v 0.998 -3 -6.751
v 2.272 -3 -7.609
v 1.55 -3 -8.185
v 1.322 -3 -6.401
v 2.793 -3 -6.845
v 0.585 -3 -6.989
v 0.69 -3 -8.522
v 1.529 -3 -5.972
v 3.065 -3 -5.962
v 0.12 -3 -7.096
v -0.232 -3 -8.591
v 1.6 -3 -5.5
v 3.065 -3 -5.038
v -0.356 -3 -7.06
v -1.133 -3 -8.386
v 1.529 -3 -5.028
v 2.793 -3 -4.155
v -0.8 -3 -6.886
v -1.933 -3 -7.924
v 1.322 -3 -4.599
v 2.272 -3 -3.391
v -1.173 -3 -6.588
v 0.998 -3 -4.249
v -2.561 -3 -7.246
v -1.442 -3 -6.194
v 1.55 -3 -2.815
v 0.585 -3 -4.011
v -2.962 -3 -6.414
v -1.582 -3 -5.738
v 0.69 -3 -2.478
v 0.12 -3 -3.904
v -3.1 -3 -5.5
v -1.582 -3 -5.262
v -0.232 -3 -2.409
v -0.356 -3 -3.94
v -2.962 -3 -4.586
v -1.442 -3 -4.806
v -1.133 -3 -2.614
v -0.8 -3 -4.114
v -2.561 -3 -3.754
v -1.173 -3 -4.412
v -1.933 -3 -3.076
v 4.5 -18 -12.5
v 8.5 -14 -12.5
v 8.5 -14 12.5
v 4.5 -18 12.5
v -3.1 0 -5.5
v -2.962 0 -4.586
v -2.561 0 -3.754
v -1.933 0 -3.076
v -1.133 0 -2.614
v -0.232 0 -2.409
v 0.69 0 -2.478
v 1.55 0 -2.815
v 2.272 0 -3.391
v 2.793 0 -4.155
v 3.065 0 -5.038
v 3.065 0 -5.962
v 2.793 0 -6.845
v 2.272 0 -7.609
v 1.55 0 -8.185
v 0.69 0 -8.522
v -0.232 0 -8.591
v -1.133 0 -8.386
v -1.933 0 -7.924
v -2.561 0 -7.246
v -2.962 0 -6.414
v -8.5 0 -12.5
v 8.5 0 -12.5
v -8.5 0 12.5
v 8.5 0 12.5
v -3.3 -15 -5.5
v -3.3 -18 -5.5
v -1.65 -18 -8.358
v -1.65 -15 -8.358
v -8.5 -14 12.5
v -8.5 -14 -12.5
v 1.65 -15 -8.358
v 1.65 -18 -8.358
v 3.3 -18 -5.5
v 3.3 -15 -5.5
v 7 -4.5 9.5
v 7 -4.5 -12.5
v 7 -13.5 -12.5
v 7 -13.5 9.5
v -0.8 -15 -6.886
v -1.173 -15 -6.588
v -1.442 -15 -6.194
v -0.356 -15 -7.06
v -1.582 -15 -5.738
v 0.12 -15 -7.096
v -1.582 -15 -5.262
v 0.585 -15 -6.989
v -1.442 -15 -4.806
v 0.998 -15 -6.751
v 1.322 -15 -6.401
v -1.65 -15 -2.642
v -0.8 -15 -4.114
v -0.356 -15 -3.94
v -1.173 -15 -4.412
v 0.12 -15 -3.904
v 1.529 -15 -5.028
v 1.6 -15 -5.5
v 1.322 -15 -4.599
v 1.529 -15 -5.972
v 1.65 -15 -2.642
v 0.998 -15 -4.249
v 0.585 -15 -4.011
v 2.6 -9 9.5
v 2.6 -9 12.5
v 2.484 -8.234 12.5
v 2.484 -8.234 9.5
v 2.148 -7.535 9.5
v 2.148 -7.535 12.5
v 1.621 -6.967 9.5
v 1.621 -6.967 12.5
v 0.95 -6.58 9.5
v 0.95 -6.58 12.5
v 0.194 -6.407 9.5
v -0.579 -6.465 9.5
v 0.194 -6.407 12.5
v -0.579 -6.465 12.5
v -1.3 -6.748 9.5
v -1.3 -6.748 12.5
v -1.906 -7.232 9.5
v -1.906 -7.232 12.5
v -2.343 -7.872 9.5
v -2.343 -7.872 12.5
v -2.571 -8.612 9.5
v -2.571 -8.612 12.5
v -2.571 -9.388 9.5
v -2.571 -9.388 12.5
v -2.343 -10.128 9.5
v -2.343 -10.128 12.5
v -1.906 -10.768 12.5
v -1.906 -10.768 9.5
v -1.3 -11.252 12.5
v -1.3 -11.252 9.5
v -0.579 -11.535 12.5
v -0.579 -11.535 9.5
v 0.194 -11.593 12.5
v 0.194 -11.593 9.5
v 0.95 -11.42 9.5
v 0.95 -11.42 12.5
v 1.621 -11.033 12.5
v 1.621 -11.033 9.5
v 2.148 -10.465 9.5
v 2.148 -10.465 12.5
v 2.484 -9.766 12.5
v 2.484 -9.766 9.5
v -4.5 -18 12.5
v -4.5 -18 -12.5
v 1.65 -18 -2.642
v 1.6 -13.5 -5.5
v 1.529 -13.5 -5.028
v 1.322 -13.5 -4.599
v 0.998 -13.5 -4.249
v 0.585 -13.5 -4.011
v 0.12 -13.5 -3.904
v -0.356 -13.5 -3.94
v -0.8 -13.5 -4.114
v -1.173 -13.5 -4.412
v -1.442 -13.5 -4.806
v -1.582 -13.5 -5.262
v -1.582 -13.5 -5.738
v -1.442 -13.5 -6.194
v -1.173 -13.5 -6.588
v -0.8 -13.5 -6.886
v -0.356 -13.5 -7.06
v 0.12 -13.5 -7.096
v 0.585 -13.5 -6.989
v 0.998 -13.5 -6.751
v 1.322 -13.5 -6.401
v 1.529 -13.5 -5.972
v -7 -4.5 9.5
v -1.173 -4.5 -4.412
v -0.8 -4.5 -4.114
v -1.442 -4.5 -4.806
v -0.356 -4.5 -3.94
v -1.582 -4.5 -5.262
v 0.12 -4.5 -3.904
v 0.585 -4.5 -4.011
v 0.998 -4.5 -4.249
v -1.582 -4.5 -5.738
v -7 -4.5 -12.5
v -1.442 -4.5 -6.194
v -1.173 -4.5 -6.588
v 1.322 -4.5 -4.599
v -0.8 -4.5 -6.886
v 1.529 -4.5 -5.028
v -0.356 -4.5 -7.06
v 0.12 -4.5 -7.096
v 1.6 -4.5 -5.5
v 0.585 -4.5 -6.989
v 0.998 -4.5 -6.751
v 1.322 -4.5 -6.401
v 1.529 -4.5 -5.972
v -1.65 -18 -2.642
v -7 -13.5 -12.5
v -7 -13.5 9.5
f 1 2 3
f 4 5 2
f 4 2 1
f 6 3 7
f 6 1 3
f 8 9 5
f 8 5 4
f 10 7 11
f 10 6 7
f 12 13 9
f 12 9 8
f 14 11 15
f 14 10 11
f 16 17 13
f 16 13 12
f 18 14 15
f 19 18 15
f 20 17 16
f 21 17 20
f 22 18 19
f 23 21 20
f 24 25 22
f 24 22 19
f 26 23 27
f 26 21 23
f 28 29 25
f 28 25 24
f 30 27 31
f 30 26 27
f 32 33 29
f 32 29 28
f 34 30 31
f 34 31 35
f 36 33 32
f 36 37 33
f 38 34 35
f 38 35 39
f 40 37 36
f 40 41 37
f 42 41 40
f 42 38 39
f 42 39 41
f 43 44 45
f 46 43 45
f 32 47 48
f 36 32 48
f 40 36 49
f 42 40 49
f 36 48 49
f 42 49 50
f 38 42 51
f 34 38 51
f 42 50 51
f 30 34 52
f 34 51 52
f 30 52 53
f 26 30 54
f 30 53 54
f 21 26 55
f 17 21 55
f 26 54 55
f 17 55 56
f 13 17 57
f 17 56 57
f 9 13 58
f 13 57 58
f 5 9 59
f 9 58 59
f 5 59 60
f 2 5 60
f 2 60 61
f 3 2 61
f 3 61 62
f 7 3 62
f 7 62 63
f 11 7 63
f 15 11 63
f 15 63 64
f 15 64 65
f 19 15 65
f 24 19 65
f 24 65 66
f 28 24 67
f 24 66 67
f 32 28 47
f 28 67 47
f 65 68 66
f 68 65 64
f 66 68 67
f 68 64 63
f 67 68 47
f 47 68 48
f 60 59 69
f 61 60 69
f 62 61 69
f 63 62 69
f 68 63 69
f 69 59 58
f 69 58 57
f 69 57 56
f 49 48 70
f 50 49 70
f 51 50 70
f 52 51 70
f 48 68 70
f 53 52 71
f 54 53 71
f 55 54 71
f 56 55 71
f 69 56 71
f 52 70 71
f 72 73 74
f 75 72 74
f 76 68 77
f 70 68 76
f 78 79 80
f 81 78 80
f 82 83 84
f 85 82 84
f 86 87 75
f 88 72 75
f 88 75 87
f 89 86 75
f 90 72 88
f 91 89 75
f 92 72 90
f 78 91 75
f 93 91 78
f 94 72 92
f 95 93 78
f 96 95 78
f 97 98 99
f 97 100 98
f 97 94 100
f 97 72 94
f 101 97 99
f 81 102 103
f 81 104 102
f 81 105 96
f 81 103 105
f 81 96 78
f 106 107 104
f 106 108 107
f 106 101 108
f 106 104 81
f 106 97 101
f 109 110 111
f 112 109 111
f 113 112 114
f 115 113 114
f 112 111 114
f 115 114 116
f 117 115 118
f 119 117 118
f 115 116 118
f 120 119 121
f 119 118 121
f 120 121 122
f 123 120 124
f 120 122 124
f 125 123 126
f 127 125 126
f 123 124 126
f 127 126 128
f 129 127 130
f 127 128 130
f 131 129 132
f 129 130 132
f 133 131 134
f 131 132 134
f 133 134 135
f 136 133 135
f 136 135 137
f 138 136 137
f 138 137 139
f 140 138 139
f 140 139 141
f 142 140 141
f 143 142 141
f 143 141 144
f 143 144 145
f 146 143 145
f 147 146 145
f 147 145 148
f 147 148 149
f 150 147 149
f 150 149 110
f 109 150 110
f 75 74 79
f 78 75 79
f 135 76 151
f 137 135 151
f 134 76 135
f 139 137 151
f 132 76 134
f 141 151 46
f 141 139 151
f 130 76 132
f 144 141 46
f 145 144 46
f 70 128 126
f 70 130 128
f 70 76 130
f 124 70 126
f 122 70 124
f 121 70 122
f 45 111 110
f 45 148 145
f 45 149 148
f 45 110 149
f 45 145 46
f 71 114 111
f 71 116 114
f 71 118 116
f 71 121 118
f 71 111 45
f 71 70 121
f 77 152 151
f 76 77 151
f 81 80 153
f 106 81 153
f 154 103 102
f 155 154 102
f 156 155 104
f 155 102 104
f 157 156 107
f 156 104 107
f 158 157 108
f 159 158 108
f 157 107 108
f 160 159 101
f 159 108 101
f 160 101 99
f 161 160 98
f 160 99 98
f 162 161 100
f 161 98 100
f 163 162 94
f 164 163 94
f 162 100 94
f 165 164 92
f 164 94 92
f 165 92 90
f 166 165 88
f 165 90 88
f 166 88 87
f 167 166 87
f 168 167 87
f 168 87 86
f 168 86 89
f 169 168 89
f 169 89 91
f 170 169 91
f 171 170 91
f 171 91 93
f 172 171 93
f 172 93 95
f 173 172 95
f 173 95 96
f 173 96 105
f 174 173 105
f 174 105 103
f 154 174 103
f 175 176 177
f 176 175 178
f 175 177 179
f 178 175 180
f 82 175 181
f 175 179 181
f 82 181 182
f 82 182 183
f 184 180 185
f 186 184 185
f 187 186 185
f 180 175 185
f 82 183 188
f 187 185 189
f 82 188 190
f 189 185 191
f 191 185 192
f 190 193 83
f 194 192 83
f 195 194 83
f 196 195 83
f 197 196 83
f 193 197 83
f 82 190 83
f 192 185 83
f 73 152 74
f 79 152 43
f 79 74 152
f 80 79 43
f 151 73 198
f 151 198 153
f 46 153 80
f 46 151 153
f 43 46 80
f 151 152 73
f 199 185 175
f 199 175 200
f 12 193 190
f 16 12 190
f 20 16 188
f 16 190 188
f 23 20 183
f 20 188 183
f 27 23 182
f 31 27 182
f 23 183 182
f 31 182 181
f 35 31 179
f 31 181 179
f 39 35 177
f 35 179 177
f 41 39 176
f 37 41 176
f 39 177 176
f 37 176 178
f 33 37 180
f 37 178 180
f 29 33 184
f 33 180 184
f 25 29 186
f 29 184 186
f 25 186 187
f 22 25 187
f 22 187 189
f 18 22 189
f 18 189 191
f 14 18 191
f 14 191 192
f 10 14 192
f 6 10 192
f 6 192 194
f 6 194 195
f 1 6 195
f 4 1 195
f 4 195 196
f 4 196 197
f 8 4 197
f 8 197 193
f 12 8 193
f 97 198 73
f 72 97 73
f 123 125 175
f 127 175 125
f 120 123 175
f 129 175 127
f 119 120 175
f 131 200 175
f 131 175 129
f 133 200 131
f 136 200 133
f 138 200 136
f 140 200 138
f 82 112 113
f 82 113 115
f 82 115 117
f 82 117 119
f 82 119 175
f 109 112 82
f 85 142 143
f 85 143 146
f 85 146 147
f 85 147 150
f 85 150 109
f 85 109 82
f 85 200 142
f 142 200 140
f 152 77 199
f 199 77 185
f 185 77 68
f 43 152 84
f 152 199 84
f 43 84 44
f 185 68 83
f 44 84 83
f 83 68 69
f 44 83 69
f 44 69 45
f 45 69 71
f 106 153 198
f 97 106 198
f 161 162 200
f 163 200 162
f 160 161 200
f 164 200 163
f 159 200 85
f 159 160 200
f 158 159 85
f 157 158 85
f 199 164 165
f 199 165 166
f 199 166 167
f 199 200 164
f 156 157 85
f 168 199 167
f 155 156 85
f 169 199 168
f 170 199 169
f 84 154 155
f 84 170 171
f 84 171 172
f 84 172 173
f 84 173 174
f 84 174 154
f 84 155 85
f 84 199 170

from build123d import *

# Parameters (mm, degrees)
F0_W      = 17
F0_H      = 25
F1_DEPTH  = 18
F2_W      = 14
F2_H      = 9
F3_DEPTH  = 22
F4_R      = 1.6
F5_DEPTH  = 25
F6_R      = 2.6
F7_DEPTH  = 25
F8_R      = 3.1
F9_DEPTH  = 3
F11_DEPTH = 3
F12_SIZE  = 4


with BuildPart() as f1:
    # F0 (on Front) → F1 (new body)
    with BuildSketch(Plane.XZ):
        Rectangle(F0_W, F0_H)
    extrude(amount=F1_DEPTH)

    # F2 (on face) → F3 (cut, through all)
    with BuildSketch(Plane(origin=(0, 0, -12.5), x_dir=(1, 0, 0), z_dir=(0, 0, -1))):
        with Locations((0, 9)):
            Rectangle(F2_W, F2_H)
    extrude(amount=-F3_DEPTH, mode=Mode.SUBTRACT)

    # F4 (on face) → F5 (cut)
    with BuildSketch(Plane.XZ.offset(18)):
        with Locations((0, -5.5)):
            Circle(F4_R)
    extrude(amount=-F5_DEPTH, mode=Mode.SUBTRACT)

    # F6 (on face) → F7 (cut)
    with BuildSketch(Plane.XY.offset(12.5)):
        with Locations((0, -9)):
            Circle(F6_R)
    extrude(amount=-F7_DEPTH, mode=Mode.SUBTRACT)

    # F8 (on face) → F9 (cut)
    with BuildSketch(Plane(origin=(0, 0, 0), x_dir=(-1, 0, 0), z_dir=(0, 1, 0))):
        with Locations((0, -5.5)):
            Circle(F8_R)
    extrude(amount=-F9_DEPTH, mode=Mode.SUBTRACT)

    # F10 (on face) → F11 (cut)
    with BuildSketch(Plane.XZ.offset(18)):
        Polygon((-1.65, -8.3578838325), (1.65, -8.3578838325), (3.3, -5.5), (1.65, -2.6421161675), (-1.65, -2.6421161675), (-3.3, -5.5), align=None)
    extrude(amount=-F11_DEPTH, mode=Mode.SUBTRACT)

    # F12
    f12_edges = [f1.edges().sort_by_distance(p)[0] for p in [
        (8.5, -18, 0),
        (-8.5, -18, 0),
    ]]
    chamfer(f12_edges, length=F12_SIZE)


solid = f1.part
